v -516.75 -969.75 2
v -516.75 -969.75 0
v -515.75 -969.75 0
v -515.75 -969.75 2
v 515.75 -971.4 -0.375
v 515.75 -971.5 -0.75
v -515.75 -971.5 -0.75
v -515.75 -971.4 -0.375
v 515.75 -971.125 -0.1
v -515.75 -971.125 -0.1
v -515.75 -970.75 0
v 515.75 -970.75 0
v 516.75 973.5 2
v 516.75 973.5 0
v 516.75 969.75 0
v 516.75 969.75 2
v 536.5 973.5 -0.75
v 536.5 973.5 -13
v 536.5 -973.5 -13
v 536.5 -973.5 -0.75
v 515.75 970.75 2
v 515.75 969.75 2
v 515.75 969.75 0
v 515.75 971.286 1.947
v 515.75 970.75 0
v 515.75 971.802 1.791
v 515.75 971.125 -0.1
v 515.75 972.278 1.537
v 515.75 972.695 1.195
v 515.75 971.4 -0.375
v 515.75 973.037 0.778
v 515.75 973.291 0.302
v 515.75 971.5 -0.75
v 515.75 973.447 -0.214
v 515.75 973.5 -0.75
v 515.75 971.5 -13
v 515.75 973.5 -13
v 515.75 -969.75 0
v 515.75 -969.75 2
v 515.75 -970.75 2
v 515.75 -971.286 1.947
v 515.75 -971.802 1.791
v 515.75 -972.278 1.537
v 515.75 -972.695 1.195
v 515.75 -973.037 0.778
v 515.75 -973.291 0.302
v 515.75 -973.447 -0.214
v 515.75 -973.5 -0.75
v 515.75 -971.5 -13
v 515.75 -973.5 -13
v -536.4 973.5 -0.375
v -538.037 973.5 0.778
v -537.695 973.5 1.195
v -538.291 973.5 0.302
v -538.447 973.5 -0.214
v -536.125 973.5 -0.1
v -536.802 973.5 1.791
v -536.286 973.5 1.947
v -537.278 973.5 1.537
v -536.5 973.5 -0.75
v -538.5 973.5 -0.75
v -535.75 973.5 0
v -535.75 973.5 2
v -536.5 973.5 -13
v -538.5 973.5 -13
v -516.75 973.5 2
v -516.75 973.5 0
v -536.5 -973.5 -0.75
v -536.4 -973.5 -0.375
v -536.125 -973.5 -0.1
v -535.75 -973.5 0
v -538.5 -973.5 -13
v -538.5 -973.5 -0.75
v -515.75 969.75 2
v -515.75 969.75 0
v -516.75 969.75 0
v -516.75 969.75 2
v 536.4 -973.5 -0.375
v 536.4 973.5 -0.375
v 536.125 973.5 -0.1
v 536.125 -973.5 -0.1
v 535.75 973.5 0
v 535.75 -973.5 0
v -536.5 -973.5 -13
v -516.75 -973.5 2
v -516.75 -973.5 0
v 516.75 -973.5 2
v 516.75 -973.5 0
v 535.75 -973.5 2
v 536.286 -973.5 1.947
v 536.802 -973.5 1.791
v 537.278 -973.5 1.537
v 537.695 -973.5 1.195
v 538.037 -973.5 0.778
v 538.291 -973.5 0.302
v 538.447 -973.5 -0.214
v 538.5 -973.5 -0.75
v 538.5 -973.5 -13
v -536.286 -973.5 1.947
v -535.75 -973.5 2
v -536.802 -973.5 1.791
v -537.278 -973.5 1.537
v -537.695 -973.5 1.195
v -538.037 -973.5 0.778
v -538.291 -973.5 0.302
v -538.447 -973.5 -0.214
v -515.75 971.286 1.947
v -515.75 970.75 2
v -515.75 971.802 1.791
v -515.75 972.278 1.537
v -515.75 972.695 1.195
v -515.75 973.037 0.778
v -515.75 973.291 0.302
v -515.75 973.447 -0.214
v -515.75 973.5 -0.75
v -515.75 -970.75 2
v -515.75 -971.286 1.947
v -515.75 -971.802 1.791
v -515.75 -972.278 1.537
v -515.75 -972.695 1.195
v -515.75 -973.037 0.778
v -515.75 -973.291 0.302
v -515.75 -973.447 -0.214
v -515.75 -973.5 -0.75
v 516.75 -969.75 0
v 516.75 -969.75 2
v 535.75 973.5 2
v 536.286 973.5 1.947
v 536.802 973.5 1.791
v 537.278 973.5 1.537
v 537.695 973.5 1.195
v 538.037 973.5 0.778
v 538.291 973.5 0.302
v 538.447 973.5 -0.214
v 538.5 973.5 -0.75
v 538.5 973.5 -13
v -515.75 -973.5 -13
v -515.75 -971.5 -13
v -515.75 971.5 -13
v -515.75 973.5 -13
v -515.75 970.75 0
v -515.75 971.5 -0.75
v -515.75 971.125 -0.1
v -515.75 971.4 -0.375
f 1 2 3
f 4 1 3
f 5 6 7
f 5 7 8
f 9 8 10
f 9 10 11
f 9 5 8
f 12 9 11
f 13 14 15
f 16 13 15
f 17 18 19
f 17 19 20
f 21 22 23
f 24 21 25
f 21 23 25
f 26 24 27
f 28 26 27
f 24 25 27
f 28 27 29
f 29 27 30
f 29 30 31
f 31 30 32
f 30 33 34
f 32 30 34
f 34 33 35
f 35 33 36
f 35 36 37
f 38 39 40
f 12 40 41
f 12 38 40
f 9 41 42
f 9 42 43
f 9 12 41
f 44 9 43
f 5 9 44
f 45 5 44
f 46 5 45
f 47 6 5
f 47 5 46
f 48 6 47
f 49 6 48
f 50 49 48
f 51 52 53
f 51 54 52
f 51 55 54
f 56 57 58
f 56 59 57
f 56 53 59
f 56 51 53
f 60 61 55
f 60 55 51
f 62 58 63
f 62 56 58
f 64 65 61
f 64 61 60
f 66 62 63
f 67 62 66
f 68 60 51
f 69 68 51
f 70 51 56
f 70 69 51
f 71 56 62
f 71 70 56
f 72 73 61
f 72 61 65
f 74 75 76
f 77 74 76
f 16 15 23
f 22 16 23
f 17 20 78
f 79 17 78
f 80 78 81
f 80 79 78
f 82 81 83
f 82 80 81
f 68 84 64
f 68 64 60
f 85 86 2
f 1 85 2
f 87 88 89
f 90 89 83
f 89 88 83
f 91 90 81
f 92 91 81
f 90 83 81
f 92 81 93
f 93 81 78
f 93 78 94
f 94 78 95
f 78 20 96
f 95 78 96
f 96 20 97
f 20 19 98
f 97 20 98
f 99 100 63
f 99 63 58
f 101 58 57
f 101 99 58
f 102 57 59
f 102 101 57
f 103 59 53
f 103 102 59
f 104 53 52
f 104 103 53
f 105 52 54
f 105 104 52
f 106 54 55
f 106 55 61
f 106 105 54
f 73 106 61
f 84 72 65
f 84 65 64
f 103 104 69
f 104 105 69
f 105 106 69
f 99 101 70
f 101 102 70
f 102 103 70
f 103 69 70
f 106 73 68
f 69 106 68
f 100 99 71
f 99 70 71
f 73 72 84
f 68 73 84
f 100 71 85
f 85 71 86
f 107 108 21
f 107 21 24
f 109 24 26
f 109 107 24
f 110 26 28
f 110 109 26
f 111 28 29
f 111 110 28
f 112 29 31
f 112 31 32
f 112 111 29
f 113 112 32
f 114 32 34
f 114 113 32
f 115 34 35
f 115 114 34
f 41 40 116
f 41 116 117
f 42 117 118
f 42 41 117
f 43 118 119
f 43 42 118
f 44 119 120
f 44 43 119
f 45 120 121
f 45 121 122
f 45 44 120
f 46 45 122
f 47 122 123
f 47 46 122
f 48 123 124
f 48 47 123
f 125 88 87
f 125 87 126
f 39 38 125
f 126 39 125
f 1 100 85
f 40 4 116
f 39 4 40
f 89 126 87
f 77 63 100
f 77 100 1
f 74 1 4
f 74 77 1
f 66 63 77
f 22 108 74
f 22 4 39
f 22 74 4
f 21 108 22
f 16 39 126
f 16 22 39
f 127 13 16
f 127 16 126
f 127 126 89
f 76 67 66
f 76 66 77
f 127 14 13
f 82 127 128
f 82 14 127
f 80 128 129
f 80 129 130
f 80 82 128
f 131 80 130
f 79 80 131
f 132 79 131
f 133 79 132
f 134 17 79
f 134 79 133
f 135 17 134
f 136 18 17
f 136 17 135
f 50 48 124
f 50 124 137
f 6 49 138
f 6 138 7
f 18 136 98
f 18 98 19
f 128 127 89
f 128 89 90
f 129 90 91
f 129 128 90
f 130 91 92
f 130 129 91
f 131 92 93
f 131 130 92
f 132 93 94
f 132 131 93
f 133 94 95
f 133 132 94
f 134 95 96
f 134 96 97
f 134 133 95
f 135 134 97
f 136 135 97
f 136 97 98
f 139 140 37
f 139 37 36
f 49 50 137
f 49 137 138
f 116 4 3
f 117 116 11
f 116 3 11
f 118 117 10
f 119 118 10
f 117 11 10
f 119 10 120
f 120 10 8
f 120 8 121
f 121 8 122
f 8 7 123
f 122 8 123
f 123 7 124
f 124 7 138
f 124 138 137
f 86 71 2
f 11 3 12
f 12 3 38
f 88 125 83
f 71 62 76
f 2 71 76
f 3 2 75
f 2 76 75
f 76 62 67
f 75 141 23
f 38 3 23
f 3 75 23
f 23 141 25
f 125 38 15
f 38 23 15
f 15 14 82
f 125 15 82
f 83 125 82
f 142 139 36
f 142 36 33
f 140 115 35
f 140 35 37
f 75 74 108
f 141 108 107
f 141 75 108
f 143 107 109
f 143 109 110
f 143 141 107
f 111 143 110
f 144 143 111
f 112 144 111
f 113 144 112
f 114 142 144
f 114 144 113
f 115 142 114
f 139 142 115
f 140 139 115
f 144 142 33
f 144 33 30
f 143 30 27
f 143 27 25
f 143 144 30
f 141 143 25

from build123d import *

# Parameters (mm, degrees)
SKETCH_1_W                          = 1077
SKETCH_1_H                          = 1947
SM_BASE_FLANGE_1_DEPTH              = 2
SM_EDGE_FLANGE_1_STRIP_W            = 9.5
SM_EDGE_FLANGE_1_STRIP_H            = 2
SM_EDGE_FLANGE_1_STRIP_CUT_DEPTH    = 1947
SM_EDGE_FLANGE_1_STRIP_2_W          = 9.5
SM_EDGE_FLANGE_1_STRIP_2_H          = 2
SM_EDGE_FLANGE_1_STRIP_CUT_2_DEPTH  = 1947
SM_EDGE_FLANGE_1_DEPTH              = 1947
SM_EDGE_FLANGE_1_BEND_DEPTH         = 1947
SM_EDGE_FLANGE_2_STRIP_W            = 9.5
SM_EDGE_FLANGE_2_STRIP_H            = 2
SM_EDGE_FLANGE_2_STRIP_CUT_DEPTH    = 1031.5
SM_EDGE_FLANGE_2_RELIEF_W           = 10.5
SM_EDGE_FLANGE_2_RELIEF_H           = 1
SM_EDGE_FLANGE_2_RELIEF_CUT_DEPTH   = 2
SM_EDGE_FLANGE_2_STRIP_2_W          = 9.5
SM_EDGE_FLANGE_2_STRIP_2_H          = 2
SM_EDGE_FLANGE_2_STRIP_CUT_2_DEPTH  = 1031.5
SM_EDGE_FLANGE_2_RELIEF_2_W         = 10.5
SM_EDGE_FLANGE_2_RELIEF_2_H         = 1
SM_EDGE_FLANGE_2_RELIEF_CUT_2_DEPTH = 2
SM_EDGE_FLANGE_2_DEPTH              = 1031.5
SM_EDGE_FLANGE_2_BEND_DEPTH         = 1031.5


# Sheet-metal steps are written as plain solids
with BuildPart() as part:
    # Sketch 1 → Базовая кромка1 (new body)
    with BuildSketch(Plane.XY):
        Rectangle(SKETCH_1_W, SKETCH_1_H)
    extrude(amount=SM_BASE_FLANGE_1_DEPTH)

    # Ребро-кромка1 strip (across the edge) → Ребро-кромка1 strip cut (cut)
    with BuildSketch(Plane(origin=(-538.5, -973.5, 0), x_dir=(1, 0, 0), z_dir=(0, 1, 0))):
        with Locations((-2, -1)):
            Rectangle(SM_EDGE_FLANGE_1_STRIP_W, SM_EDGE_FLANGE_1_STRIP_H)
    extrude(amount=SM_EDGE_FLANGE_1_STRIP_CUT_DEPTH, mode=Mode.SUBTRACT)

    # Ребро-кромка1 strip 2 (across the edge) → Ребро-кромка1 strip cut 2 (cut)
    with BuildSketch(Plane(origin=(538.5, 973.5, 0), x_dir=(-1, 0, 0), z_dir=(0, -1, 0))):
        with Locations((-2, -1)):
            Rectangle(SM_EDGE_FLANGE_1_STRIP_2_W, SM_EDGE_FLANGE_1_STRIP_2_H)
    extrude(amount=SM_EDGE_FLANGE_1_STRIP_CUT_2_DEPTH, mode=Mode.SUBTRACT)

    # Ребро-кромка1 section (across the edge) → Ребро-кромка1 (add)
    with BuildSketch(Plane(origin=(-538.5, -973.5, 0), x_dir=(1, 0, 0), z_dir=(0, 1, 0))):
        with BuildLine():
            Line((0, 0.75), (0, 13))
            Line((0, 13), (2, 13))
            Line((2, 13), (2, 0.75))
            ThreePointArc((2, 0.75), (2.219669914, 0.219669914), (2.75, 0))
            Line((2.75, 0), (2.75, -2))
            ThreePointArc((2.75, -2), (0.805456352, -1.194543648), (0, 0.75))
        make_face()
    extrude(amount=SM_EDGE_FLANGE_1_DEPTH)

    # Ребро-кромка1 section 2 (across the edge) → Ребро-кромка1 bend (add)
    with BuildSketch(Plane(origin=(538.5, 973.5, 0), x_dir=(-1, 0, 0), z_dir=(0, -1, 0))):
        with BuildLine():
            Line((0, 0.75), (0, 13))
            Line((0, 13), (2, 13))
            Line((2, 13), (2, 0.75))
            ThreePointArc((2, 0.75), (2.219669914, 0.219669914), (2.75, 0))
            Line((2.75, 0), (2.75, -2))
            ThreePointArc((2.75, -2), (0.805456352, -1.194543648), (0, 0.75))
        make_face()
    extrude(amount=SM_EDGE_FLANGE_1_BEND_DEPTH)

    # Ребро-кромка2 strip (across the edge) → Ребро-кромка2 strip cut (cut)
    with BuildSketch(Plane(origin=(-515.75, 973.5, 0), x_dir=(0, -1, 0), z_dir=(1, 0, 0))):
        with Locations((-2, -1)):
            Rectangle(SM_EDGE_FLANGE_2_STRIP_W, SM_EDGE_FLANGE_2_STRIP_H)
    extrude(amount=SM_EDGE_FLANGE_2_STRIP_CUT_DEPTH, mode=Mode.SUBTRACT)

    # Ребро-кромка2 relief (on the sheet) → Ребро-кромка2 relief cut (cut)
    with BuildSketch(Plane(origin=(-515.75, 970.75, 0), x_dir=(0, -1, 0), z_dir=(0, 0, -1))):
        with Locations((-4.25, 0.5)):
            Rectangle(SM_EDGE_FLANGE_2_RELIEF_W, SM_EDGE_FLANGE_2_RELIEF_H)
        with Locations((-4.25, -1032)):
            Rectangle(SM_EDGE_FLANGE_2_RELIEF_W, SM_EDGE_FLANGE_2_RELIEF_H)
    extrude(amount=-SM_EDGE_FLANGE_2_RELIEF_CUT_DEPTH, mode=Mode.SUBTRACT)

    # Ребро-кромка2 strip 2 (across the edge) → Ребро-кромка2 strip cut 2 (cut)
    with BuildSketch(Plane(origin=(515.75, -973.5, 0), x_dir=(0, 1, 0), z_dir=(-1, 0, 0))):
        with Locations((-2, -1)):
            Rectangle(SM_EDGE_FLANGE_2_STRIP_2_W, SM_EDGE_FLANGE_2_STRIP_2_H)
    extrude(amount=SM_EDGE_FLANGE_2_STRIP_CUT_2_DEPTH, mode=Mode.SUBTRACT)

    # Ребро-кромка2 relief 2 (on the sheet) → Ребро-кромка2 relief cut 2 (cut)
    with BuildSketch(Plane(origin=(515.75, -970.75, 0), x_dir=(0, 1, 0), z_dir=(0, 0, -1))):
        with Locations((-4.25, 0.5)):
            Rectangle(SM_EDGE_FLANGE_2_RELIEF_2_W, SM_EDGE_FLANGE_2_RELIEF_2_H)
        with Locations((-4.25, -1032)):
            Rectangle(SM_EDGE_FLANGE_2_RELIEF_2_W, SM_EDGE_FLANGE_2_RELIEF_2_H)
    extrude(amount=-SM_EDGE_FLANGE_2_RELIEF_CUT_2_DEPTH, mode=Mode.SUBTRACT)

    # Ребро-кромка2 section (across the edge) → Ребро-кромка2 (add)
    with BuildSketch(Plane(origin=(-515.75, 973.5, 0), x_dir=(0, -1, 0), z_dir=(1, 0, 0))):
        with BuildLine():
            Line((0, 0.75), (0, 13))
            Line((0, 13), (2, 13))
            Line((2, 13), (2, 0.75))
            ThreePointArc((2, 0.75), (2.219669914, 0.219669914), (2.75, 0))
            Line((2.75, 0), (2.75, -2))
            ThreePointArc((2.75, -2), (0.805456352, -1.194543648), (0, 0.75))
        make_face()
    extrude(amount=SM_EDGE_FLANGE_2_DEPTH)

    # Ребро-кромка2 section 2 (across the edge) → Ребро-кромка2 bend (add)
    with BuildSketch(Plane(origin=(515.75, -973.5, 0), x_dir=(0, 1, 0), z_dir=(-1, 0, 0))):
        with BuildLine():
            Line((0, 0.75), (0, 13))
            Line((0, 13), (2, 13))
            Line((2, 13), (2, 0.75))
            ThreePointArc((2, 0.75), (2.219669914, 0.219669914), (2.75, 0))
            Line((2.75, 0), (2.75, -2))
            ThreePointArc((2.75, -2), (0.805456352, -1.194543648), (0, 0.75))
        make_face()
    extrude(amount=SM_EDGE_FLANGE_2_BEND_DEPTH)


solid = part.part
